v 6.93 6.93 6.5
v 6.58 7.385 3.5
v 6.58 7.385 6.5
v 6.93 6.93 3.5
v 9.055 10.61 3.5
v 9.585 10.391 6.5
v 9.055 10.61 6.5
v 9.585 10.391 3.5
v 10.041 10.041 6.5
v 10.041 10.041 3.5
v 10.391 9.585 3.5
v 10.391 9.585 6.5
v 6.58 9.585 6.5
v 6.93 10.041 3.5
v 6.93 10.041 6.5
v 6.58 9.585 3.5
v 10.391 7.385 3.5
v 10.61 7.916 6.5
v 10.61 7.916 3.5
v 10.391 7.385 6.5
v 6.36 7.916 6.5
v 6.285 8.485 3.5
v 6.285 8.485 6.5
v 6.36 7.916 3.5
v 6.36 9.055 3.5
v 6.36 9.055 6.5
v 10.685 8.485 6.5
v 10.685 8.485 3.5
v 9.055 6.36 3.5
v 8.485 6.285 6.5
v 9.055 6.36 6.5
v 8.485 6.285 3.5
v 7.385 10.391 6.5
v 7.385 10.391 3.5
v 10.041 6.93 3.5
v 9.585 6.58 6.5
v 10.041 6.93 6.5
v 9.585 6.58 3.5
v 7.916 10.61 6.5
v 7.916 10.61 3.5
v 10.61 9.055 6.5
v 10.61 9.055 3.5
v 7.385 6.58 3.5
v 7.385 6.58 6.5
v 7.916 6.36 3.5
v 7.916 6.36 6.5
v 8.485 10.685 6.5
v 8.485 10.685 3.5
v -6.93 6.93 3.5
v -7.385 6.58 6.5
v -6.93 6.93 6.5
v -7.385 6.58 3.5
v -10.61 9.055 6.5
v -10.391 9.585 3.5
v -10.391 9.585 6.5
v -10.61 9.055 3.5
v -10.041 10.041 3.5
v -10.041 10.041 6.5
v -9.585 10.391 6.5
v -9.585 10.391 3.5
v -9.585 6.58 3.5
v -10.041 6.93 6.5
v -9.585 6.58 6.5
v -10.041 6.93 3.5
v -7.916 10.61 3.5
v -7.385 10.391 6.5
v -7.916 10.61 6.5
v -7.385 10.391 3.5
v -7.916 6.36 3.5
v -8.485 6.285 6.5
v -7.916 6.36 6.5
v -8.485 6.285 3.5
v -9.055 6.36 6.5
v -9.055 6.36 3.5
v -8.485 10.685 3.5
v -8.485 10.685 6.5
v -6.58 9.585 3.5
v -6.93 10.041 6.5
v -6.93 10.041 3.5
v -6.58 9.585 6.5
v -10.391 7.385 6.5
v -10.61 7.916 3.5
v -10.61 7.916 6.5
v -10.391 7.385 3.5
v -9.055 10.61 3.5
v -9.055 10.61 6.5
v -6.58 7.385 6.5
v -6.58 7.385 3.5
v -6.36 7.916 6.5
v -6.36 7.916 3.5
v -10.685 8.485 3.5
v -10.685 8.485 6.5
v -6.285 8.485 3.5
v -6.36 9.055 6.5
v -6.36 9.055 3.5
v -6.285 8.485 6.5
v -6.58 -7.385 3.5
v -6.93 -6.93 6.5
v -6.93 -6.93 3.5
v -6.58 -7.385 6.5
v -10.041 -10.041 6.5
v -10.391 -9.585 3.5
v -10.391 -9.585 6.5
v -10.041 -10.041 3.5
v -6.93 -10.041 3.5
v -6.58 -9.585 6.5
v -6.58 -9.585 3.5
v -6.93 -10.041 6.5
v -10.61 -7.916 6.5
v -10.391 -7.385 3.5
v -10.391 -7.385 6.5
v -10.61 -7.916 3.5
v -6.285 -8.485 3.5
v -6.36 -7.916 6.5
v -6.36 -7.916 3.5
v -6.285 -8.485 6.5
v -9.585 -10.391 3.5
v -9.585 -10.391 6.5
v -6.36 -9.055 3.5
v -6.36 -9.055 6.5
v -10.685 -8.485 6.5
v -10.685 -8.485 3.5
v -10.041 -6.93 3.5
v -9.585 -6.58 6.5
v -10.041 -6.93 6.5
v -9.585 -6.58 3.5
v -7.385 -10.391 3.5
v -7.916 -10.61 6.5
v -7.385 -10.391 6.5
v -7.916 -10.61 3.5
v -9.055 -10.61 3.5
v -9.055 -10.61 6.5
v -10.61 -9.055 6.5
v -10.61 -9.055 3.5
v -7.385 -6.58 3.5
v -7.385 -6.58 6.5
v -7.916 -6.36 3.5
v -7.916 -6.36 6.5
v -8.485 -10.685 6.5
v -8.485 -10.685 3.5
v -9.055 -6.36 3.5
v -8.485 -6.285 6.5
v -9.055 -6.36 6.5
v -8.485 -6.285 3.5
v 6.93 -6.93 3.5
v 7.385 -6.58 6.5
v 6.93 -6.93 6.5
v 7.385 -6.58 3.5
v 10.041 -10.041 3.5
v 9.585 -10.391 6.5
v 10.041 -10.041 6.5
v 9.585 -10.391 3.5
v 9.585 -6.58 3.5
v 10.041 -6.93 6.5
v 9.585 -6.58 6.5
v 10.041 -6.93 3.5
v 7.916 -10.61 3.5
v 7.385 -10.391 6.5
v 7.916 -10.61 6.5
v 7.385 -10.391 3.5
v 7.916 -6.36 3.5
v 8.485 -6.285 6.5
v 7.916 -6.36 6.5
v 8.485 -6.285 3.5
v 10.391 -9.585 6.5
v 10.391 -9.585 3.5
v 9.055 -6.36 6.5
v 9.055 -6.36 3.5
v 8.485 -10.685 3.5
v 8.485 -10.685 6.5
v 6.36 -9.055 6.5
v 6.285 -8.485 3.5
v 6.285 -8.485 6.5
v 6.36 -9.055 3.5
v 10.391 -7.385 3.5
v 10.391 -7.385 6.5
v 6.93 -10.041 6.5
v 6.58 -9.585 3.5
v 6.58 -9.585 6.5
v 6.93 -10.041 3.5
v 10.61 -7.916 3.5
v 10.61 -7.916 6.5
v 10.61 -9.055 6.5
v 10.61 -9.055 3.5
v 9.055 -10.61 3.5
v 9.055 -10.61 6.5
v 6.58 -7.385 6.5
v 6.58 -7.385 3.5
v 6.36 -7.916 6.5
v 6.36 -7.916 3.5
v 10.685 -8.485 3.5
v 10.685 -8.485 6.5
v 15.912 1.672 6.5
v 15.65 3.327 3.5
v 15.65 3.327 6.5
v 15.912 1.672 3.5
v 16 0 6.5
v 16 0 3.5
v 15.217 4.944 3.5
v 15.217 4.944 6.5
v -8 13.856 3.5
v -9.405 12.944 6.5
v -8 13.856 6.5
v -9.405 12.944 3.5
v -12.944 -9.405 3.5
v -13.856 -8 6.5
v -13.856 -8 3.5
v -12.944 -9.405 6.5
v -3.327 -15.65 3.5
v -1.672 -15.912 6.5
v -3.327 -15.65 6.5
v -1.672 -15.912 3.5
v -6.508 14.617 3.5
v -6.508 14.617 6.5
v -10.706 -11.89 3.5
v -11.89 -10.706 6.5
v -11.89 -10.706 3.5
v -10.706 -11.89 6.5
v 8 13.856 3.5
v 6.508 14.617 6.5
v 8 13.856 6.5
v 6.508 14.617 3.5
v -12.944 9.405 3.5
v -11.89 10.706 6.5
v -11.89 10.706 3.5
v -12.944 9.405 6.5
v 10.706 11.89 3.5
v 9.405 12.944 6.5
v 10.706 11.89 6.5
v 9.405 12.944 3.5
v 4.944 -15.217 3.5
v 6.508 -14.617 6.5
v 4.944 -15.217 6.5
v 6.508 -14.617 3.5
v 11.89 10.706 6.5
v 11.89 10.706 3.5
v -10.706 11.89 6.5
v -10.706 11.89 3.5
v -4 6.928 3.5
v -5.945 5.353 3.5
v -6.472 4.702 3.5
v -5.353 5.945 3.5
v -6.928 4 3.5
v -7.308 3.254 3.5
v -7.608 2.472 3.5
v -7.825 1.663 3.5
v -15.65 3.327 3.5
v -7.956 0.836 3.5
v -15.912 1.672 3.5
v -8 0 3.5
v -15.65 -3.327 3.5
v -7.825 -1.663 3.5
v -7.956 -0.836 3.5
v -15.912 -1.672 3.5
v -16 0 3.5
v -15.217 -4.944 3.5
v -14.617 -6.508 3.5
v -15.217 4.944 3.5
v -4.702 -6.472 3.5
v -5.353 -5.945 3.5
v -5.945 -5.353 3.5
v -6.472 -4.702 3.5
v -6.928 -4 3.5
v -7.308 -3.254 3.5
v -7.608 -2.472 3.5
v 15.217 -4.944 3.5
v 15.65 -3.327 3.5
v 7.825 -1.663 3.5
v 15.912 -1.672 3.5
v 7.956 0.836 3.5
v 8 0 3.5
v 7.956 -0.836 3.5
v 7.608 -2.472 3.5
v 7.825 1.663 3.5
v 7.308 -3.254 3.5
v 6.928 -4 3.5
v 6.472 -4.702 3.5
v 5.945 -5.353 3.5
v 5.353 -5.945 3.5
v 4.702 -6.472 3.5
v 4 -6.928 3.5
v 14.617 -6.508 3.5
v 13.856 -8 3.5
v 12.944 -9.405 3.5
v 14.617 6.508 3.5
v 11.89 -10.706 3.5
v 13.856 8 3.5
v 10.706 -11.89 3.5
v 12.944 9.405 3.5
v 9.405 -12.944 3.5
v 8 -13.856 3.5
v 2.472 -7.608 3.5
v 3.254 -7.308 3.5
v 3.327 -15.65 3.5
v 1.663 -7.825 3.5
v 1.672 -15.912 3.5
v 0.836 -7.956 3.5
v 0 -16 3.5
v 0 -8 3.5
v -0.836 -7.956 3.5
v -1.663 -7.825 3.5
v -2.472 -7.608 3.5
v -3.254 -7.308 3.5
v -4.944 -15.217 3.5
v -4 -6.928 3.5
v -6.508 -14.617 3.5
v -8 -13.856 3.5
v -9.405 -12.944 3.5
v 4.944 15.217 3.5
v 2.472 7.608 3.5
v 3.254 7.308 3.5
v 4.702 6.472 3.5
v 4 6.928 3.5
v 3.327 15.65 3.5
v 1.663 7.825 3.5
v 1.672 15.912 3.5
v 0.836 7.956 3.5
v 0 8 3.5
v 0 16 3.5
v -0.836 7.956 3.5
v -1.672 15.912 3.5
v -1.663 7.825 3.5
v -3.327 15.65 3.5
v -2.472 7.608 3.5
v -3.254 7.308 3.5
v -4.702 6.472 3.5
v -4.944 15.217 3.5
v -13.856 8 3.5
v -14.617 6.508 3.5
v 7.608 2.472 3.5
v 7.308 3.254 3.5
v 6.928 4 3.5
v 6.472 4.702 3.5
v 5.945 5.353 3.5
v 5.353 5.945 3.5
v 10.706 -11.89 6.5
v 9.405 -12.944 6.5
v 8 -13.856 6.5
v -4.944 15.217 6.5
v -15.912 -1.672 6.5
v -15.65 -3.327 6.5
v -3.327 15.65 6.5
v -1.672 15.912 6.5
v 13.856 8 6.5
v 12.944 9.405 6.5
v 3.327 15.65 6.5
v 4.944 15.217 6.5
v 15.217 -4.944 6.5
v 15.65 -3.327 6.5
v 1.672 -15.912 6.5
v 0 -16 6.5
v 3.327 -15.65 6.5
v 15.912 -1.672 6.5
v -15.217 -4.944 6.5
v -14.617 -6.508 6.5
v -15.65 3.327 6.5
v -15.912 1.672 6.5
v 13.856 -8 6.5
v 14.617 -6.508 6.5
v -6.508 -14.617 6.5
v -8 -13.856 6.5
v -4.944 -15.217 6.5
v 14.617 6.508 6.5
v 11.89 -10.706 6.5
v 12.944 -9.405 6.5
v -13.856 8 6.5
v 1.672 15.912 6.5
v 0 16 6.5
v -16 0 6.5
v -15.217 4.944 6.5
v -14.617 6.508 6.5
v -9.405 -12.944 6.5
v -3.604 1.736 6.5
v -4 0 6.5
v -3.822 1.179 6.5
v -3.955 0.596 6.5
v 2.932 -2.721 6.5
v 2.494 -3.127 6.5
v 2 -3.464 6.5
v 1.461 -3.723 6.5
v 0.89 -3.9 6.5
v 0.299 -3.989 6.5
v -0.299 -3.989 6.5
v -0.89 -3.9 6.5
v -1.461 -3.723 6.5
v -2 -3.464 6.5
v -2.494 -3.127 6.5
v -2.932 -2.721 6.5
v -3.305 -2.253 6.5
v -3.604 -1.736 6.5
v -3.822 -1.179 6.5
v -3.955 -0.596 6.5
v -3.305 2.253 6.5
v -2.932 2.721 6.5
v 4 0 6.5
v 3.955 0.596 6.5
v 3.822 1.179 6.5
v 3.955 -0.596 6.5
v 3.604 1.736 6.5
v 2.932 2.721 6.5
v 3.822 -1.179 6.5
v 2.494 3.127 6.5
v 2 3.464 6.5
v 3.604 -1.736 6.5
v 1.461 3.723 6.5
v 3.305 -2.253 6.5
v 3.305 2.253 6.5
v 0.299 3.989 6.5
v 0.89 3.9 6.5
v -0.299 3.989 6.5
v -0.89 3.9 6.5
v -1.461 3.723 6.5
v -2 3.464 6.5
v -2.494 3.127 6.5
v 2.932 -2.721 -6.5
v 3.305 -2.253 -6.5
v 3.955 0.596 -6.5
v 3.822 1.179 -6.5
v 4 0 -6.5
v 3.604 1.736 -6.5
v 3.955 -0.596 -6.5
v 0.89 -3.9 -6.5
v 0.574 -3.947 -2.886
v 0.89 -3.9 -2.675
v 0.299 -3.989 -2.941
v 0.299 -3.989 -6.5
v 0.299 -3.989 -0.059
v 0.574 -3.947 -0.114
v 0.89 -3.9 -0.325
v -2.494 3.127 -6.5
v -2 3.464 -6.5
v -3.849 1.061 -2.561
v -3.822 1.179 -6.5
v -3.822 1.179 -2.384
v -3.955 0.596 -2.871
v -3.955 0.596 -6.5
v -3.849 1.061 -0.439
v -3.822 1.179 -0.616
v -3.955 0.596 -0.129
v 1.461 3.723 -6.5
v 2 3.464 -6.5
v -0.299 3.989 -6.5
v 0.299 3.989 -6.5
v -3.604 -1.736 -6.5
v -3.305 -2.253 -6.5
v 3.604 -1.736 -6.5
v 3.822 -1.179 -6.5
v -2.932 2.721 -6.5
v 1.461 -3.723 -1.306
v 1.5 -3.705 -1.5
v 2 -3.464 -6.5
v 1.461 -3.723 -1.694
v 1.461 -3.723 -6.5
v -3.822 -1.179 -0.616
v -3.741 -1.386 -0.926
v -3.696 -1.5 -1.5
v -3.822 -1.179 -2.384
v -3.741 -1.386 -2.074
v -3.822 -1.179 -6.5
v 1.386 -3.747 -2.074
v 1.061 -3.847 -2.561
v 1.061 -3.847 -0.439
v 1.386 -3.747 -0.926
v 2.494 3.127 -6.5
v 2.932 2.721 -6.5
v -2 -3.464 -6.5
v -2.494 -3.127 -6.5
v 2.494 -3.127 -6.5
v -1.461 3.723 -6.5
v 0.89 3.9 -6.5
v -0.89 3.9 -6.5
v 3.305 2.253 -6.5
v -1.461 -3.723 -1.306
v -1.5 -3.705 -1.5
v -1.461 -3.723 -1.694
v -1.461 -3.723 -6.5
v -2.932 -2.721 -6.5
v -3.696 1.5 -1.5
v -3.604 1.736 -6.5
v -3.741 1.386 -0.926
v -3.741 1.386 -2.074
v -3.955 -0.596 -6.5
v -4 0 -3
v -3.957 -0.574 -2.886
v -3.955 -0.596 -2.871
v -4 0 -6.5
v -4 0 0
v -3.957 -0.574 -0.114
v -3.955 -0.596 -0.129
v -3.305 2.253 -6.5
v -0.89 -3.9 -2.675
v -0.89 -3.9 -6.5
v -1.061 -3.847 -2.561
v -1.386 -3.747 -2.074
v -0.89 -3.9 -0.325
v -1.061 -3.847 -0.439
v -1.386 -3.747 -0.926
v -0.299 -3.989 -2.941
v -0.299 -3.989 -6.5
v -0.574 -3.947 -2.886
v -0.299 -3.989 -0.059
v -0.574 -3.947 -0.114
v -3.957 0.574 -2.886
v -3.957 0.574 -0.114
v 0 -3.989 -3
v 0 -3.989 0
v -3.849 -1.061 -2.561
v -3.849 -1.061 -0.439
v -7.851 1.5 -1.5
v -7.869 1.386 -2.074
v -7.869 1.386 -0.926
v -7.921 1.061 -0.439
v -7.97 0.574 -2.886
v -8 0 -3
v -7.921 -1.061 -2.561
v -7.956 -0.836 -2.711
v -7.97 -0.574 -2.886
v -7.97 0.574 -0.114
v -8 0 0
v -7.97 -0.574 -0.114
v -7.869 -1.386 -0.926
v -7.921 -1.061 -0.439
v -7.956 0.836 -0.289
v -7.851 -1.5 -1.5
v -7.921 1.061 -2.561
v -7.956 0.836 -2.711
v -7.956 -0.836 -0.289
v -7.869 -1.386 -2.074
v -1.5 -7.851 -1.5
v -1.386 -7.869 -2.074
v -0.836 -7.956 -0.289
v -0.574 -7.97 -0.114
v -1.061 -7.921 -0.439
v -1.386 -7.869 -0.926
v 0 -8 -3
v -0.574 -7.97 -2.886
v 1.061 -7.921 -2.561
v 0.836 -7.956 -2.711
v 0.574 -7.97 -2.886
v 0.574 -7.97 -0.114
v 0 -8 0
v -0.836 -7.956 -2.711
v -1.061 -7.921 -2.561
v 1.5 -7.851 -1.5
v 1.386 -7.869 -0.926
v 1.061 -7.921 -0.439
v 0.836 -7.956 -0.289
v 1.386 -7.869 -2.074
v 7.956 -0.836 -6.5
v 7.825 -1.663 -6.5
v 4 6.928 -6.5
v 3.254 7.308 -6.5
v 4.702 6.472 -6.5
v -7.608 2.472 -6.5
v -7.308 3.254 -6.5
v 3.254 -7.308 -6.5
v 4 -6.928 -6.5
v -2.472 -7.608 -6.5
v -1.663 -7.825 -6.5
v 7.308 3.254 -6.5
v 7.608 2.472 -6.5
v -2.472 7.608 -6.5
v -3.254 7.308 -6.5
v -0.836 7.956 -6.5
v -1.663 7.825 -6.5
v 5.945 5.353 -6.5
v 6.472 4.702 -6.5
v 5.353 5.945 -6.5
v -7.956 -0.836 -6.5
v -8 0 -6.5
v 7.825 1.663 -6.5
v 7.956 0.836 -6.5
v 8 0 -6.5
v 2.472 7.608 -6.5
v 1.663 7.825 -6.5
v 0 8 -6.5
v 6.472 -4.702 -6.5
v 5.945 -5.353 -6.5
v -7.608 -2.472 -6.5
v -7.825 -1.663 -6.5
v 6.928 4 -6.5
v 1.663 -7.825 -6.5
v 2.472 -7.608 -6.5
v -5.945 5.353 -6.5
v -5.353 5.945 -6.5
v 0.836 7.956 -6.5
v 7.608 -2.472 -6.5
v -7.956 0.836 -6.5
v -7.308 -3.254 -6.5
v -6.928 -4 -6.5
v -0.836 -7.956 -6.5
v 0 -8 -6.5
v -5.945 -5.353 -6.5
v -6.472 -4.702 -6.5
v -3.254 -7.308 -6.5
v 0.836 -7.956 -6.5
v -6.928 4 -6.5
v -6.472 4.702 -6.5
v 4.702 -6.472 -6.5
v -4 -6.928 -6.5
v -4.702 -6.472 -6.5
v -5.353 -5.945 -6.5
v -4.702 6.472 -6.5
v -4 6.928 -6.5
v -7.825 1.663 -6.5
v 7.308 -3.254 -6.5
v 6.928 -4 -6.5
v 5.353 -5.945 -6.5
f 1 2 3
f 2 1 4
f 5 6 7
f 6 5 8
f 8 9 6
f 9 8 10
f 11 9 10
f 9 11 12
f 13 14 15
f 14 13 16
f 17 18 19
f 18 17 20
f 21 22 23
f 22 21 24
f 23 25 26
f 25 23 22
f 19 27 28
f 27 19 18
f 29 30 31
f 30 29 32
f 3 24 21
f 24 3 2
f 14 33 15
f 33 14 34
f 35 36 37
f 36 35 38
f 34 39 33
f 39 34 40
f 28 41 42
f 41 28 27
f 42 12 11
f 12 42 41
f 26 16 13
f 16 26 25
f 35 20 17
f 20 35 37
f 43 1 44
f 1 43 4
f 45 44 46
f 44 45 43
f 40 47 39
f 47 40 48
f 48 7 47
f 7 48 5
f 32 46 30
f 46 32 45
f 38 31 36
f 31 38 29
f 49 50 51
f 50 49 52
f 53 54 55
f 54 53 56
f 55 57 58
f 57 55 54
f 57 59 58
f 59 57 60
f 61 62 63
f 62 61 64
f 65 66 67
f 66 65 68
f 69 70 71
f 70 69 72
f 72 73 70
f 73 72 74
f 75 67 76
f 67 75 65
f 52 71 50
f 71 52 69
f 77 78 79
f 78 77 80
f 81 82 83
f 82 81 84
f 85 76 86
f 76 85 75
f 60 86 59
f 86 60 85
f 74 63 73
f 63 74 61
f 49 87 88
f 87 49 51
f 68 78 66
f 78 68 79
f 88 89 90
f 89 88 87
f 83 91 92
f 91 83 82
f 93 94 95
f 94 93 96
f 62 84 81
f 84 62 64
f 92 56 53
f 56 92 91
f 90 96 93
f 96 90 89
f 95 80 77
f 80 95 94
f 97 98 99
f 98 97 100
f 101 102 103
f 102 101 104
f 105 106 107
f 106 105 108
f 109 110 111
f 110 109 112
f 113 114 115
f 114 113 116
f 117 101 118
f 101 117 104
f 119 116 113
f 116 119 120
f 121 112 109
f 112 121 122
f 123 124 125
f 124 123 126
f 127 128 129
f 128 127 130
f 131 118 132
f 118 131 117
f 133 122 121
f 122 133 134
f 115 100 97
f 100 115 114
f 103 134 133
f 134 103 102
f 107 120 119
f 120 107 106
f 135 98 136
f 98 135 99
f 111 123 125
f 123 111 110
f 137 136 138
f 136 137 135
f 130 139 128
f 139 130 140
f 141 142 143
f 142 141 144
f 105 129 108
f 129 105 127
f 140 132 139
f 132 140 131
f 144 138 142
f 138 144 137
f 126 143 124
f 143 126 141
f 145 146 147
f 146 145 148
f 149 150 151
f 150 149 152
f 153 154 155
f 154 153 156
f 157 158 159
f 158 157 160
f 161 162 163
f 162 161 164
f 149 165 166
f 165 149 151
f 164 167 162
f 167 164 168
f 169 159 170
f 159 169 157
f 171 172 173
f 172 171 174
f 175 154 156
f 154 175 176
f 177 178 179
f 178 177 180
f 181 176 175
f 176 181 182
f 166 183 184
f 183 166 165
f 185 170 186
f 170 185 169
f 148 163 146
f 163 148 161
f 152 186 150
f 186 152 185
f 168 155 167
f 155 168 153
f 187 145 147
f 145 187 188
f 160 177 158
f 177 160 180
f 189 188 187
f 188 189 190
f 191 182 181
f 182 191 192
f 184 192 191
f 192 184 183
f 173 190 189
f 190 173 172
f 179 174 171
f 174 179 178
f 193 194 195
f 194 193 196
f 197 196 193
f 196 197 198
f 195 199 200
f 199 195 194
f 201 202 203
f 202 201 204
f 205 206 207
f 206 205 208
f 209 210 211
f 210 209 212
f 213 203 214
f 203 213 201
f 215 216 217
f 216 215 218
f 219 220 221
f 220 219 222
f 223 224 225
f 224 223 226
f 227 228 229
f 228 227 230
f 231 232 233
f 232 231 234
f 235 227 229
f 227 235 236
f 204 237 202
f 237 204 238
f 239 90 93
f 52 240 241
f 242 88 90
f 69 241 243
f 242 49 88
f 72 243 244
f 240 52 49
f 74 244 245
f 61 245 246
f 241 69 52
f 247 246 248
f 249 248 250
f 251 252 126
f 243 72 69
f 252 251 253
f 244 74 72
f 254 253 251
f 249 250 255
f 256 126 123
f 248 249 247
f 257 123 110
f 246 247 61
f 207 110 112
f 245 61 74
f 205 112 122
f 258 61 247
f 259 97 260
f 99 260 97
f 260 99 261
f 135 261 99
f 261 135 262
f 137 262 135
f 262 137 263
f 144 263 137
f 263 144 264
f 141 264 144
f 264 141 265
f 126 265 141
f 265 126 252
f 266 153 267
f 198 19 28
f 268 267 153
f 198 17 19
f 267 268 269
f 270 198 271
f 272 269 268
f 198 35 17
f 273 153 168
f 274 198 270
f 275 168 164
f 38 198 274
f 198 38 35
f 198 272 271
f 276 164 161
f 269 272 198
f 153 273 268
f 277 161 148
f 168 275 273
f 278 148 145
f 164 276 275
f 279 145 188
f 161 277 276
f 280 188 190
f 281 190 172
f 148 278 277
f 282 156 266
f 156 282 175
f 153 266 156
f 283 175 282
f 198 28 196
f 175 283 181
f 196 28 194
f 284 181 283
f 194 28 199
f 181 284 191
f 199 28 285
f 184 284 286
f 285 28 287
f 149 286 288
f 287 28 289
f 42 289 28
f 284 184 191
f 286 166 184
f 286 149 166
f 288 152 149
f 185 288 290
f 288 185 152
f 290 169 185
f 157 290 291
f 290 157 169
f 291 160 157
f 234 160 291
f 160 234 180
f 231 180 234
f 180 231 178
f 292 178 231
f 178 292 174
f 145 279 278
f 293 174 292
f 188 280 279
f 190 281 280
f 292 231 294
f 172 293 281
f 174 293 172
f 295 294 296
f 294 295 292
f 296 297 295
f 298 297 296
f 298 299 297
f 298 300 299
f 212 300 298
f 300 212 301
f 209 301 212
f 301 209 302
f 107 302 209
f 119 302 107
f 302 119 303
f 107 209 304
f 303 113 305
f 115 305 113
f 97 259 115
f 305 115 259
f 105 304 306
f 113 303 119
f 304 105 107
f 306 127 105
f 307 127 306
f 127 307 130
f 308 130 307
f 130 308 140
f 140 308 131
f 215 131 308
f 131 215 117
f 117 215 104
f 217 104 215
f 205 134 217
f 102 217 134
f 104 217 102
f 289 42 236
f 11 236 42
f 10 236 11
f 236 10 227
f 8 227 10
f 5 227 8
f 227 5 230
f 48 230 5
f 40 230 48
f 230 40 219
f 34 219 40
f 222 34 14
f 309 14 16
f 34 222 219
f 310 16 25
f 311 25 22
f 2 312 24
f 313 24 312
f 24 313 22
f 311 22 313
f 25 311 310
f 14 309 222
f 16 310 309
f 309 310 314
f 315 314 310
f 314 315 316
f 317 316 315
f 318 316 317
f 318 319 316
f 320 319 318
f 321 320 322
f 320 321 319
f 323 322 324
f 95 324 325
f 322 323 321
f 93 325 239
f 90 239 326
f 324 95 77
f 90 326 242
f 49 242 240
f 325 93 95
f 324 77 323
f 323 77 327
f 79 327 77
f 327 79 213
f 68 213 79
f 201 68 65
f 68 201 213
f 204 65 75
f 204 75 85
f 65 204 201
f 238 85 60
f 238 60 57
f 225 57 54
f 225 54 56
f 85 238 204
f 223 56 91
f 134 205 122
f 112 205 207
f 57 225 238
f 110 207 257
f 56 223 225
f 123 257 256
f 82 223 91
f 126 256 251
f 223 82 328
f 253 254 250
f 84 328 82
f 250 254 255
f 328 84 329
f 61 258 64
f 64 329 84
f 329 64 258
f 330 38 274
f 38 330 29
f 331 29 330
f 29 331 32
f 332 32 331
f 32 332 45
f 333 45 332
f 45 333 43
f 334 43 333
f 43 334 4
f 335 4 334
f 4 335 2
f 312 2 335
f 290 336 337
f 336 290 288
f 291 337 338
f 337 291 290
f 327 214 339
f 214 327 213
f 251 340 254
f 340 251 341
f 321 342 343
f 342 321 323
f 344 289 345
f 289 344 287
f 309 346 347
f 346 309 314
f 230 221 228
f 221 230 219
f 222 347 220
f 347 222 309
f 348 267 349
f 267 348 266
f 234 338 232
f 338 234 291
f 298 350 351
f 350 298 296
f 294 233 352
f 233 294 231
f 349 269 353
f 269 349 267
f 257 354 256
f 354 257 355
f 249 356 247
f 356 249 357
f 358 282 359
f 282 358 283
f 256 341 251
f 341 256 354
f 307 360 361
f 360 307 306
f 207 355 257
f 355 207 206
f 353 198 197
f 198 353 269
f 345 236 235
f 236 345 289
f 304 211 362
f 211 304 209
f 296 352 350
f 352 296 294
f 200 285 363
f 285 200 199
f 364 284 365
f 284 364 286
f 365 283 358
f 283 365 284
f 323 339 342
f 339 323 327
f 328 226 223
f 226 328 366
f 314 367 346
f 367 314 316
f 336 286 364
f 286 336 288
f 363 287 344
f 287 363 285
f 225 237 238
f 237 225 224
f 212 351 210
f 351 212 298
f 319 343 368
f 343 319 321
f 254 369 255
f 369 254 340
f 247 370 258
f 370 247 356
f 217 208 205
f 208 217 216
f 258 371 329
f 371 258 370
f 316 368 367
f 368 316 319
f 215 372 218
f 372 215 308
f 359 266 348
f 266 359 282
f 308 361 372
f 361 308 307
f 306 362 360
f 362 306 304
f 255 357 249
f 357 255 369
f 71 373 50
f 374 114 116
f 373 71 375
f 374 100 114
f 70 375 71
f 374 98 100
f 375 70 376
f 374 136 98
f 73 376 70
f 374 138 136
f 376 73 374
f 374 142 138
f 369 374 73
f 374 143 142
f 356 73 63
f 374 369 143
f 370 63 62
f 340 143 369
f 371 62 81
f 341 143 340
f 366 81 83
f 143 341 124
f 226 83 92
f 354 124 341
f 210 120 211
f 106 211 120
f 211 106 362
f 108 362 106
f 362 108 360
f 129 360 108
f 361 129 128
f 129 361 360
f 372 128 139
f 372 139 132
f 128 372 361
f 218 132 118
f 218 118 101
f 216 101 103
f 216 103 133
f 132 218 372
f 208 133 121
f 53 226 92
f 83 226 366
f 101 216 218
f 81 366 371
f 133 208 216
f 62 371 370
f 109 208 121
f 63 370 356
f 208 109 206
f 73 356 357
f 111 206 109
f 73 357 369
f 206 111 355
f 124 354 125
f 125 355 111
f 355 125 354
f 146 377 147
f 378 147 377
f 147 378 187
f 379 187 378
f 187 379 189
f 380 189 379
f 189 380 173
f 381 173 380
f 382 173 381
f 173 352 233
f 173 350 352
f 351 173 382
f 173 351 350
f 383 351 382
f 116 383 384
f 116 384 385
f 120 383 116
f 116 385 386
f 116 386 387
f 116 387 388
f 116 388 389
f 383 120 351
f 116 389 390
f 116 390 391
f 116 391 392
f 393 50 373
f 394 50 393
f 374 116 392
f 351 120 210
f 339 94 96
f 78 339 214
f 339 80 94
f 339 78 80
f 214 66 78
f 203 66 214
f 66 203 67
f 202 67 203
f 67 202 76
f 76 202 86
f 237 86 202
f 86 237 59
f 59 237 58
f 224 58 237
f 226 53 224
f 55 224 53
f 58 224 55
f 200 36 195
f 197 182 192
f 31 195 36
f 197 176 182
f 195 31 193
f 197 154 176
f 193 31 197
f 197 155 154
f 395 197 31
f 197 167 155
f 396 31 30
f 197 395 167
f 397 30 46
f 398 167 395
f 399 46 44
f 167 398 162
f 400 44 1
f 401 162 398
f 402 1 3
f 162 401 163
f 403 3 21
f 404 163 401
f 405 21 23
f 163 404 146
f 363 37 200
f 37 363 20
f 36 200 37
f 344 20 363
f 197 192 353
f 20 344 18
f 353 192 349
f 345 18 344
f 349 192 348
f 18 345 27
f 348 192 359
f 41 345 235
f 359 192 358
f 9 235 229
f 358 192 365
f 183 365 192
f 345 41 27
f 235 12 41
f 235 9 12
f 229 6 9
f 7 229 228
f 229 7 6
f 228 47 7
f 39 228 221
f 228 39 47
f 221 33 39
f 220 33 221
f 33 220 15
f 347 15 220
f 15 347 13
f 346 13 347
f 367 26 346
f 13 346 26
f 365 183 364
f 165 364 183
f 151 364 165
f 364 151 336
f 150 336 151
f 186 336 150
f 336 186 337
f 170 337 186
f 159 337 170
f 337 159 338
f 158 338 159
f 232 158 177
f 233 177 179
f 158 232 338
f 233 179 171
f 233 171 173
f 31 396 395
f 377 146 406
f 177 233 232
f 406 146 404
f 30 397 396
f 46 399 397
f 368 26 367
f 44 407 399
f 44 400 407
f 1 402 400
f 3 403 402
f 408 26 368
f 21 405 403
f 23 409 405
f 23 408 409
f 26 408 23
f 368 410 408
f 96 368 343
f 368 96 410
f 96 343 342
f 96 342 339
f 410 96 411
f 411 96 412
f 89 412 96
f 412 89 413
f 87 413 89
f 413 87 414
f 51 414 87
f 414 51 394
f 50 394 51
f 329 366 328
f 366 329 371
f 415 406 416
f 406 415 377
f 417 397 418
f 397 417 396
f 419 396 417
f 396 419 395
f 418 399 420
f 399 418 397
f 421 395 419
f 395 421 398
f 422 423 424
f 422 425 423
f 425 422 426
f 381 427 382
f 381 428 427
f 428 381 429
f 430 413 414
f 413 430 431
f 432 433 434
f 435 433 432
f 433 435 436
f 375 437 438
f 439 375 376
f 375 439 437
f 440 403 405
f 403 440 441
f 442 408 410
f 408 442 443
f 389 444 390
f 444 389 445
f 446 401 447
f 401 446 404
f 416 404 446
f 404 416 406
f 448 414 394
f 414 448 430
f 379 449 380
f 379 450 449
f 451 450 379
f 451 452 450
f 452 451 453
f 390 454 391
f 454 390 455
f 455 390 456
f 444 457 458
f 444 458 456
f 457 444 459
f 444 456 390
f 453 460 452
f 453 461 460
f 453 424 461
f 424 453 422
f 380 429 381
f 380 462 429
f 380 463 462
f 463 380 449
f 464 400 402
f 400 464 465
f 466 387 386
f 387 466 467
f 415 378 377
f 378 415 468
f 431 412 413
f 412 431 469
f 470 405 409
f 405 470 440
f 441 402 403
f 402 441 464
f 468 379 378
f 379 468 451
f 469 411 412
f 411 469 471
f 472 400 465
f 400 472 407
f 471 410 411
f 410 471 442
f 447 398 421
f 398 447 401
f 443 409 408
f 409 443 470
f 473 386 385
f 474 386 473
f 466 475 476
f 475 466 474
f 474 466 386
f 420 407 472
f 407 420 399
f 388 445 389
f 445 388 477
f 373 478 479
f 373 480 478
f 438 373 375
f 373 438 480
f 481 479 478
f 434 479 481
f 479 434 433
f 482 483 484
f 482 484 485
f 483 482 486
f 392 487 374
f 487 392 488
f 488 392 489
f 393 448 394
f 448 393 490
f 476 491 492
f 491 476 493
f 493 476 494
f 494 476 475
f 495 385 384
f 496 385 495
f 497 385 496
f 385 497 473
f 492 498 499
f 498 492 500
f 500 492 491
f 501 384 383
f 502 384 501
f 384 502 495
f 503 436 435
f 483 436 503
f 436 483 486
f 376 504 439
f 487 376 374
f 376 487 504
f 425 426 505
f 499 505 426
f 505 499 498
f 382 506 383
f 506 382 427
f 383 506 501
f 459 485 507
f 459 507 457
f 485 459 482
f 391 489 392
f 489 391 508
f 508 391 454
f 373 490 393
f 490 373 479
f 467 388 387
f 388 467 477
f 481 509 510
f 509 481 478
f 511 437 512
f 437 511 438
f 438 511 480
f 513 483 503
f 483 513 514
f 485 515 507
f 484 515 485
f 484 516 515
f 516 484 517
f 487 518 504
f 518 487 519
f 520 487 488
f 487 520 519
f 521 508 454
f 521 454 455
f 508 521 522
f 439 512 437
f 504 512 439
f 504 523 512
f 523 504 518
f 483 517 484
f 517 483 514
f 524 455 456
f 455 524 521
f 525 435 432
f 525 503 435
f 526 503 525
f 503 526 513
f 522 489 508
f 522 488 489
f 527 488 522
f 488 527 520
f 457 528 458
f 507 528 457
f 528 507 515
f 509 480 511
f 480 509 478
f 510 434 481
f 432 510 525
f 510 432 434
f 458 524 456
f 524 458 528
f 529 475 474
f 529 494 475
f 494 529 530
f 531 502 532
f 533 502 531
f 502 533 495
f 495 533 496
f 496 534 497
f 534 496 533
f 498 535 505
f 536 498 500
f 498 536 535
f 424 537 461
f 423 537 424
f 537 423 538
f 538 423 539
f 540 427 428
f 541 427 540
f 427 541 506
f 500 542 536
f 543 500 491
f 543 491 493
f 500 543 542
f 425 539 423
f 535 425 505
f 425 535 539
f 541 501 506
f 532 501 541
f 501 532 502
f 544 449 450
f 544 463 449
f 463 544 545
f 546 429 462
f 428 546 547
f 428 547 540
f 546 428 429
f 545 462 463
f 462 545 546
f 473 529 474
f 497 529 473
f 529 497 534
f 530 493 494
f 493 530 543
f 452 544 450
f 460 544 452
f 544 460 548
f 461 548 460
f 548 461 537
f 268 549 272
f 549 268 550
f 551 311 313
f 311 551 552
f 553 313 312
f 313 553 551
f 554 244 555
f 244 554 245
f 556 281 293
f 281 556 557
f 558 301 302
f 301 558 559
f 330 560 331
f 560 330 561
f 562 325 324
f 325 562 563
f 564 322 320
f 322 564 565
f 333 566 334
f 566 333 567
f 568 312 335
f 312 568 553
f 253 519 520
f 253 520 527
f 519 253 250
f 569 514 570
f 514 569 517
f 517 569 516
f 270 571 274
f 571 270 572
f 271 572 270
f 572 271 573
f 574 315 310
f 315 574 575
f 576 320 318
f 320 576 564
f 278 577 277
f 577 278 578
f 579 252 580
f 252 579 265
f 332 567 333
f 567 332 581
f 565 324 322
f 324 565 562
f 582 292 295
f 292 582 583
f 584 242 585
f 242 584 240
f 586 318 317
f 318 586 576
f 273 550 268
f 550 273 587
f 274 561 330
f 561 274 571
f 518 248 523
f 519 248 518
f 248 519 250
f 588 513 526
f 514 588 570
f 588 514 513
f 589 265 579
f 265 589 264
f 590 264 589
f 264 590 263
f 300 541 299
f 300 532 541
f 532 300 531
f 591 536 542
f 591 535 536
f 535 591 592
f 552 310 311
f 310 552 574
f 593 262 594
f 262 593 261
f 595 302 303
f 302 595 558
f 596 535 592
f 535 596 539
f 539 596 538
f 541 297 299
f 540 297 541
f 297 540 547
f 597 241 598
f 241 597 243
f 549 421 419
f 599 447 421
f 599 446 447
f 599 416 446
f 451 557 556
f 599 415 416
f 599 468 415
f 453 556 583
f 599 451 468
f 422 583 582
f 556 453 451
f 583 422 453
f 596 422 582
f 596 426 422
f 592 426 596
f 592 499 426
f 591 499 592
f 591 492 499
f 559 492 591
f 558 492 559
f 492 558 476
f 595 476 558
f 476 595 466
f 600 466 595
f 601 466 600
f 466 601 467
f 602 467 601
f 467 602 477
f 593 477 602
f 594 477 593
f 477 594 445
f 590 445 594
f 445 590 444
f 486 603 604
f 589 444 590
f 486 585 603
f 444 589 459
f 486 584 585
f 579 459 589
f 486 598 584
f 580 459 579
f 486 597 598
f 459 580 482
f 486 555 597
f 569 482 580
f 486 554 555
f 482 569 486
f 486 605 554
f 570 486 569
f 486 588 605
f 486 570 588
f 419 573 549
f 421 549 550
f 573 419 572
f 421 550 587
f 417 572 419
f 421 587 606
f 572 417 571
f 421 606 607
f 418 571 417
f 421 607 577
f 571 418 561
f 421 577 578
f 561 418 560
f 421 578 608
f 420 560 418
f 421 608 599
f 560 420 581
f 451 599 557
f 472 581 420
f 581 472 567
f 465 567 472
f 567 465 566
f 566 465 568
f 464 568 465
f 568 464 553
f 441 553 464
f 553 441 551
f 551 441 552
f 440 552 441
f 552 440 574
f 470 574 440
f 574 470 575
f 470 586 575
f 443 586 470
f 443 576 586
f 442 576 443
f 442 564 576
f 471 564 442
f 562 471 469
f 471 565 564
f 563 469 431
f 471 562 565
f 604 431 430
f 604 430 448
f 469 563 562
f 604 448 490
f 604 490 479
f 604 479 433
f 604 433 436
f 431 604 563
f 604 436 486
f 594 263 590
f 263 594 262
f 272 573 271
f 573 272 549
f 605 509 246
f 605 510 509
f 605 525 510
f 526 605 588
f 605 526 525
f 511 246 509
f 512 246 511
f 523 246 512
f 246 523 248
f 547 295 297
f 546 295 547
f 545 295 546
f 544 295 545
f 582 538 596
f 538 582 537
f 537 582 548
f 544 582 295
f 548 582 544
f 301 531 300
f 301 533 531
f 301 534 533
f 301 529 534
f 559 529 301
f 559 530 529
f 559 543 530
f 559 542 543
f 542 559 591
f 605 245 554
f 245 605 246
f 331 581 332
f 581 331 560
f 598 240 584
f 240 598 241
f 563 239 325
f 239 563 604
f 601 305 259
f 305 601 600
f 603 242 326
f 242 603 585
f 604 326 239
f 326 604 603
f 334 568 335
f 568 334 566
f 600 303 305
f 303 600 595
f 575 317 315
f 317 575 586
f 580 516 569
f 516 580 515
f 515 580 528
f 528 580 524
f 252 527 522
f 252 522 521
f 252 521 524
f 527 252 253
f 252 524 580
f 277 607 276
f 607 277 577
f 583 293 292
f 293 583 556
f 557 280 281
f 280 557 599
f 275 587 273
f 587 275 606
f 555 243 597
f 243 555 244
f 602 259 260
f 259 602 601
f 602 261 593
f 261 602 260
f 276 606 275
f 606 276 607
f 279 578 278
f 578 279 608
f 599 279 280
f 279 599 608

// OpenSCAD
use <common.scad>

// 용어
// 1. 플랜지 커플러(flange coupler)
// 2. 플랜지(flange)
// 3. 보디(body)
// 4. 볼트 원 반지름(bolt circle radius)

// 전체 높이는 기준 하단부 3 mm와 상단 원통부 10 mm의 합입니다.
function flange_coupler_8mm_h() = 13;

module flange_coupler_8mm(part_color = [0, 1, 0.35]) {
    flange_coupler(part_color = part_color,
                   bolt_radius = 12,
                   bolt_count = 4,
                   bolt_d = 4);
}

flange_coupler_8mm();
